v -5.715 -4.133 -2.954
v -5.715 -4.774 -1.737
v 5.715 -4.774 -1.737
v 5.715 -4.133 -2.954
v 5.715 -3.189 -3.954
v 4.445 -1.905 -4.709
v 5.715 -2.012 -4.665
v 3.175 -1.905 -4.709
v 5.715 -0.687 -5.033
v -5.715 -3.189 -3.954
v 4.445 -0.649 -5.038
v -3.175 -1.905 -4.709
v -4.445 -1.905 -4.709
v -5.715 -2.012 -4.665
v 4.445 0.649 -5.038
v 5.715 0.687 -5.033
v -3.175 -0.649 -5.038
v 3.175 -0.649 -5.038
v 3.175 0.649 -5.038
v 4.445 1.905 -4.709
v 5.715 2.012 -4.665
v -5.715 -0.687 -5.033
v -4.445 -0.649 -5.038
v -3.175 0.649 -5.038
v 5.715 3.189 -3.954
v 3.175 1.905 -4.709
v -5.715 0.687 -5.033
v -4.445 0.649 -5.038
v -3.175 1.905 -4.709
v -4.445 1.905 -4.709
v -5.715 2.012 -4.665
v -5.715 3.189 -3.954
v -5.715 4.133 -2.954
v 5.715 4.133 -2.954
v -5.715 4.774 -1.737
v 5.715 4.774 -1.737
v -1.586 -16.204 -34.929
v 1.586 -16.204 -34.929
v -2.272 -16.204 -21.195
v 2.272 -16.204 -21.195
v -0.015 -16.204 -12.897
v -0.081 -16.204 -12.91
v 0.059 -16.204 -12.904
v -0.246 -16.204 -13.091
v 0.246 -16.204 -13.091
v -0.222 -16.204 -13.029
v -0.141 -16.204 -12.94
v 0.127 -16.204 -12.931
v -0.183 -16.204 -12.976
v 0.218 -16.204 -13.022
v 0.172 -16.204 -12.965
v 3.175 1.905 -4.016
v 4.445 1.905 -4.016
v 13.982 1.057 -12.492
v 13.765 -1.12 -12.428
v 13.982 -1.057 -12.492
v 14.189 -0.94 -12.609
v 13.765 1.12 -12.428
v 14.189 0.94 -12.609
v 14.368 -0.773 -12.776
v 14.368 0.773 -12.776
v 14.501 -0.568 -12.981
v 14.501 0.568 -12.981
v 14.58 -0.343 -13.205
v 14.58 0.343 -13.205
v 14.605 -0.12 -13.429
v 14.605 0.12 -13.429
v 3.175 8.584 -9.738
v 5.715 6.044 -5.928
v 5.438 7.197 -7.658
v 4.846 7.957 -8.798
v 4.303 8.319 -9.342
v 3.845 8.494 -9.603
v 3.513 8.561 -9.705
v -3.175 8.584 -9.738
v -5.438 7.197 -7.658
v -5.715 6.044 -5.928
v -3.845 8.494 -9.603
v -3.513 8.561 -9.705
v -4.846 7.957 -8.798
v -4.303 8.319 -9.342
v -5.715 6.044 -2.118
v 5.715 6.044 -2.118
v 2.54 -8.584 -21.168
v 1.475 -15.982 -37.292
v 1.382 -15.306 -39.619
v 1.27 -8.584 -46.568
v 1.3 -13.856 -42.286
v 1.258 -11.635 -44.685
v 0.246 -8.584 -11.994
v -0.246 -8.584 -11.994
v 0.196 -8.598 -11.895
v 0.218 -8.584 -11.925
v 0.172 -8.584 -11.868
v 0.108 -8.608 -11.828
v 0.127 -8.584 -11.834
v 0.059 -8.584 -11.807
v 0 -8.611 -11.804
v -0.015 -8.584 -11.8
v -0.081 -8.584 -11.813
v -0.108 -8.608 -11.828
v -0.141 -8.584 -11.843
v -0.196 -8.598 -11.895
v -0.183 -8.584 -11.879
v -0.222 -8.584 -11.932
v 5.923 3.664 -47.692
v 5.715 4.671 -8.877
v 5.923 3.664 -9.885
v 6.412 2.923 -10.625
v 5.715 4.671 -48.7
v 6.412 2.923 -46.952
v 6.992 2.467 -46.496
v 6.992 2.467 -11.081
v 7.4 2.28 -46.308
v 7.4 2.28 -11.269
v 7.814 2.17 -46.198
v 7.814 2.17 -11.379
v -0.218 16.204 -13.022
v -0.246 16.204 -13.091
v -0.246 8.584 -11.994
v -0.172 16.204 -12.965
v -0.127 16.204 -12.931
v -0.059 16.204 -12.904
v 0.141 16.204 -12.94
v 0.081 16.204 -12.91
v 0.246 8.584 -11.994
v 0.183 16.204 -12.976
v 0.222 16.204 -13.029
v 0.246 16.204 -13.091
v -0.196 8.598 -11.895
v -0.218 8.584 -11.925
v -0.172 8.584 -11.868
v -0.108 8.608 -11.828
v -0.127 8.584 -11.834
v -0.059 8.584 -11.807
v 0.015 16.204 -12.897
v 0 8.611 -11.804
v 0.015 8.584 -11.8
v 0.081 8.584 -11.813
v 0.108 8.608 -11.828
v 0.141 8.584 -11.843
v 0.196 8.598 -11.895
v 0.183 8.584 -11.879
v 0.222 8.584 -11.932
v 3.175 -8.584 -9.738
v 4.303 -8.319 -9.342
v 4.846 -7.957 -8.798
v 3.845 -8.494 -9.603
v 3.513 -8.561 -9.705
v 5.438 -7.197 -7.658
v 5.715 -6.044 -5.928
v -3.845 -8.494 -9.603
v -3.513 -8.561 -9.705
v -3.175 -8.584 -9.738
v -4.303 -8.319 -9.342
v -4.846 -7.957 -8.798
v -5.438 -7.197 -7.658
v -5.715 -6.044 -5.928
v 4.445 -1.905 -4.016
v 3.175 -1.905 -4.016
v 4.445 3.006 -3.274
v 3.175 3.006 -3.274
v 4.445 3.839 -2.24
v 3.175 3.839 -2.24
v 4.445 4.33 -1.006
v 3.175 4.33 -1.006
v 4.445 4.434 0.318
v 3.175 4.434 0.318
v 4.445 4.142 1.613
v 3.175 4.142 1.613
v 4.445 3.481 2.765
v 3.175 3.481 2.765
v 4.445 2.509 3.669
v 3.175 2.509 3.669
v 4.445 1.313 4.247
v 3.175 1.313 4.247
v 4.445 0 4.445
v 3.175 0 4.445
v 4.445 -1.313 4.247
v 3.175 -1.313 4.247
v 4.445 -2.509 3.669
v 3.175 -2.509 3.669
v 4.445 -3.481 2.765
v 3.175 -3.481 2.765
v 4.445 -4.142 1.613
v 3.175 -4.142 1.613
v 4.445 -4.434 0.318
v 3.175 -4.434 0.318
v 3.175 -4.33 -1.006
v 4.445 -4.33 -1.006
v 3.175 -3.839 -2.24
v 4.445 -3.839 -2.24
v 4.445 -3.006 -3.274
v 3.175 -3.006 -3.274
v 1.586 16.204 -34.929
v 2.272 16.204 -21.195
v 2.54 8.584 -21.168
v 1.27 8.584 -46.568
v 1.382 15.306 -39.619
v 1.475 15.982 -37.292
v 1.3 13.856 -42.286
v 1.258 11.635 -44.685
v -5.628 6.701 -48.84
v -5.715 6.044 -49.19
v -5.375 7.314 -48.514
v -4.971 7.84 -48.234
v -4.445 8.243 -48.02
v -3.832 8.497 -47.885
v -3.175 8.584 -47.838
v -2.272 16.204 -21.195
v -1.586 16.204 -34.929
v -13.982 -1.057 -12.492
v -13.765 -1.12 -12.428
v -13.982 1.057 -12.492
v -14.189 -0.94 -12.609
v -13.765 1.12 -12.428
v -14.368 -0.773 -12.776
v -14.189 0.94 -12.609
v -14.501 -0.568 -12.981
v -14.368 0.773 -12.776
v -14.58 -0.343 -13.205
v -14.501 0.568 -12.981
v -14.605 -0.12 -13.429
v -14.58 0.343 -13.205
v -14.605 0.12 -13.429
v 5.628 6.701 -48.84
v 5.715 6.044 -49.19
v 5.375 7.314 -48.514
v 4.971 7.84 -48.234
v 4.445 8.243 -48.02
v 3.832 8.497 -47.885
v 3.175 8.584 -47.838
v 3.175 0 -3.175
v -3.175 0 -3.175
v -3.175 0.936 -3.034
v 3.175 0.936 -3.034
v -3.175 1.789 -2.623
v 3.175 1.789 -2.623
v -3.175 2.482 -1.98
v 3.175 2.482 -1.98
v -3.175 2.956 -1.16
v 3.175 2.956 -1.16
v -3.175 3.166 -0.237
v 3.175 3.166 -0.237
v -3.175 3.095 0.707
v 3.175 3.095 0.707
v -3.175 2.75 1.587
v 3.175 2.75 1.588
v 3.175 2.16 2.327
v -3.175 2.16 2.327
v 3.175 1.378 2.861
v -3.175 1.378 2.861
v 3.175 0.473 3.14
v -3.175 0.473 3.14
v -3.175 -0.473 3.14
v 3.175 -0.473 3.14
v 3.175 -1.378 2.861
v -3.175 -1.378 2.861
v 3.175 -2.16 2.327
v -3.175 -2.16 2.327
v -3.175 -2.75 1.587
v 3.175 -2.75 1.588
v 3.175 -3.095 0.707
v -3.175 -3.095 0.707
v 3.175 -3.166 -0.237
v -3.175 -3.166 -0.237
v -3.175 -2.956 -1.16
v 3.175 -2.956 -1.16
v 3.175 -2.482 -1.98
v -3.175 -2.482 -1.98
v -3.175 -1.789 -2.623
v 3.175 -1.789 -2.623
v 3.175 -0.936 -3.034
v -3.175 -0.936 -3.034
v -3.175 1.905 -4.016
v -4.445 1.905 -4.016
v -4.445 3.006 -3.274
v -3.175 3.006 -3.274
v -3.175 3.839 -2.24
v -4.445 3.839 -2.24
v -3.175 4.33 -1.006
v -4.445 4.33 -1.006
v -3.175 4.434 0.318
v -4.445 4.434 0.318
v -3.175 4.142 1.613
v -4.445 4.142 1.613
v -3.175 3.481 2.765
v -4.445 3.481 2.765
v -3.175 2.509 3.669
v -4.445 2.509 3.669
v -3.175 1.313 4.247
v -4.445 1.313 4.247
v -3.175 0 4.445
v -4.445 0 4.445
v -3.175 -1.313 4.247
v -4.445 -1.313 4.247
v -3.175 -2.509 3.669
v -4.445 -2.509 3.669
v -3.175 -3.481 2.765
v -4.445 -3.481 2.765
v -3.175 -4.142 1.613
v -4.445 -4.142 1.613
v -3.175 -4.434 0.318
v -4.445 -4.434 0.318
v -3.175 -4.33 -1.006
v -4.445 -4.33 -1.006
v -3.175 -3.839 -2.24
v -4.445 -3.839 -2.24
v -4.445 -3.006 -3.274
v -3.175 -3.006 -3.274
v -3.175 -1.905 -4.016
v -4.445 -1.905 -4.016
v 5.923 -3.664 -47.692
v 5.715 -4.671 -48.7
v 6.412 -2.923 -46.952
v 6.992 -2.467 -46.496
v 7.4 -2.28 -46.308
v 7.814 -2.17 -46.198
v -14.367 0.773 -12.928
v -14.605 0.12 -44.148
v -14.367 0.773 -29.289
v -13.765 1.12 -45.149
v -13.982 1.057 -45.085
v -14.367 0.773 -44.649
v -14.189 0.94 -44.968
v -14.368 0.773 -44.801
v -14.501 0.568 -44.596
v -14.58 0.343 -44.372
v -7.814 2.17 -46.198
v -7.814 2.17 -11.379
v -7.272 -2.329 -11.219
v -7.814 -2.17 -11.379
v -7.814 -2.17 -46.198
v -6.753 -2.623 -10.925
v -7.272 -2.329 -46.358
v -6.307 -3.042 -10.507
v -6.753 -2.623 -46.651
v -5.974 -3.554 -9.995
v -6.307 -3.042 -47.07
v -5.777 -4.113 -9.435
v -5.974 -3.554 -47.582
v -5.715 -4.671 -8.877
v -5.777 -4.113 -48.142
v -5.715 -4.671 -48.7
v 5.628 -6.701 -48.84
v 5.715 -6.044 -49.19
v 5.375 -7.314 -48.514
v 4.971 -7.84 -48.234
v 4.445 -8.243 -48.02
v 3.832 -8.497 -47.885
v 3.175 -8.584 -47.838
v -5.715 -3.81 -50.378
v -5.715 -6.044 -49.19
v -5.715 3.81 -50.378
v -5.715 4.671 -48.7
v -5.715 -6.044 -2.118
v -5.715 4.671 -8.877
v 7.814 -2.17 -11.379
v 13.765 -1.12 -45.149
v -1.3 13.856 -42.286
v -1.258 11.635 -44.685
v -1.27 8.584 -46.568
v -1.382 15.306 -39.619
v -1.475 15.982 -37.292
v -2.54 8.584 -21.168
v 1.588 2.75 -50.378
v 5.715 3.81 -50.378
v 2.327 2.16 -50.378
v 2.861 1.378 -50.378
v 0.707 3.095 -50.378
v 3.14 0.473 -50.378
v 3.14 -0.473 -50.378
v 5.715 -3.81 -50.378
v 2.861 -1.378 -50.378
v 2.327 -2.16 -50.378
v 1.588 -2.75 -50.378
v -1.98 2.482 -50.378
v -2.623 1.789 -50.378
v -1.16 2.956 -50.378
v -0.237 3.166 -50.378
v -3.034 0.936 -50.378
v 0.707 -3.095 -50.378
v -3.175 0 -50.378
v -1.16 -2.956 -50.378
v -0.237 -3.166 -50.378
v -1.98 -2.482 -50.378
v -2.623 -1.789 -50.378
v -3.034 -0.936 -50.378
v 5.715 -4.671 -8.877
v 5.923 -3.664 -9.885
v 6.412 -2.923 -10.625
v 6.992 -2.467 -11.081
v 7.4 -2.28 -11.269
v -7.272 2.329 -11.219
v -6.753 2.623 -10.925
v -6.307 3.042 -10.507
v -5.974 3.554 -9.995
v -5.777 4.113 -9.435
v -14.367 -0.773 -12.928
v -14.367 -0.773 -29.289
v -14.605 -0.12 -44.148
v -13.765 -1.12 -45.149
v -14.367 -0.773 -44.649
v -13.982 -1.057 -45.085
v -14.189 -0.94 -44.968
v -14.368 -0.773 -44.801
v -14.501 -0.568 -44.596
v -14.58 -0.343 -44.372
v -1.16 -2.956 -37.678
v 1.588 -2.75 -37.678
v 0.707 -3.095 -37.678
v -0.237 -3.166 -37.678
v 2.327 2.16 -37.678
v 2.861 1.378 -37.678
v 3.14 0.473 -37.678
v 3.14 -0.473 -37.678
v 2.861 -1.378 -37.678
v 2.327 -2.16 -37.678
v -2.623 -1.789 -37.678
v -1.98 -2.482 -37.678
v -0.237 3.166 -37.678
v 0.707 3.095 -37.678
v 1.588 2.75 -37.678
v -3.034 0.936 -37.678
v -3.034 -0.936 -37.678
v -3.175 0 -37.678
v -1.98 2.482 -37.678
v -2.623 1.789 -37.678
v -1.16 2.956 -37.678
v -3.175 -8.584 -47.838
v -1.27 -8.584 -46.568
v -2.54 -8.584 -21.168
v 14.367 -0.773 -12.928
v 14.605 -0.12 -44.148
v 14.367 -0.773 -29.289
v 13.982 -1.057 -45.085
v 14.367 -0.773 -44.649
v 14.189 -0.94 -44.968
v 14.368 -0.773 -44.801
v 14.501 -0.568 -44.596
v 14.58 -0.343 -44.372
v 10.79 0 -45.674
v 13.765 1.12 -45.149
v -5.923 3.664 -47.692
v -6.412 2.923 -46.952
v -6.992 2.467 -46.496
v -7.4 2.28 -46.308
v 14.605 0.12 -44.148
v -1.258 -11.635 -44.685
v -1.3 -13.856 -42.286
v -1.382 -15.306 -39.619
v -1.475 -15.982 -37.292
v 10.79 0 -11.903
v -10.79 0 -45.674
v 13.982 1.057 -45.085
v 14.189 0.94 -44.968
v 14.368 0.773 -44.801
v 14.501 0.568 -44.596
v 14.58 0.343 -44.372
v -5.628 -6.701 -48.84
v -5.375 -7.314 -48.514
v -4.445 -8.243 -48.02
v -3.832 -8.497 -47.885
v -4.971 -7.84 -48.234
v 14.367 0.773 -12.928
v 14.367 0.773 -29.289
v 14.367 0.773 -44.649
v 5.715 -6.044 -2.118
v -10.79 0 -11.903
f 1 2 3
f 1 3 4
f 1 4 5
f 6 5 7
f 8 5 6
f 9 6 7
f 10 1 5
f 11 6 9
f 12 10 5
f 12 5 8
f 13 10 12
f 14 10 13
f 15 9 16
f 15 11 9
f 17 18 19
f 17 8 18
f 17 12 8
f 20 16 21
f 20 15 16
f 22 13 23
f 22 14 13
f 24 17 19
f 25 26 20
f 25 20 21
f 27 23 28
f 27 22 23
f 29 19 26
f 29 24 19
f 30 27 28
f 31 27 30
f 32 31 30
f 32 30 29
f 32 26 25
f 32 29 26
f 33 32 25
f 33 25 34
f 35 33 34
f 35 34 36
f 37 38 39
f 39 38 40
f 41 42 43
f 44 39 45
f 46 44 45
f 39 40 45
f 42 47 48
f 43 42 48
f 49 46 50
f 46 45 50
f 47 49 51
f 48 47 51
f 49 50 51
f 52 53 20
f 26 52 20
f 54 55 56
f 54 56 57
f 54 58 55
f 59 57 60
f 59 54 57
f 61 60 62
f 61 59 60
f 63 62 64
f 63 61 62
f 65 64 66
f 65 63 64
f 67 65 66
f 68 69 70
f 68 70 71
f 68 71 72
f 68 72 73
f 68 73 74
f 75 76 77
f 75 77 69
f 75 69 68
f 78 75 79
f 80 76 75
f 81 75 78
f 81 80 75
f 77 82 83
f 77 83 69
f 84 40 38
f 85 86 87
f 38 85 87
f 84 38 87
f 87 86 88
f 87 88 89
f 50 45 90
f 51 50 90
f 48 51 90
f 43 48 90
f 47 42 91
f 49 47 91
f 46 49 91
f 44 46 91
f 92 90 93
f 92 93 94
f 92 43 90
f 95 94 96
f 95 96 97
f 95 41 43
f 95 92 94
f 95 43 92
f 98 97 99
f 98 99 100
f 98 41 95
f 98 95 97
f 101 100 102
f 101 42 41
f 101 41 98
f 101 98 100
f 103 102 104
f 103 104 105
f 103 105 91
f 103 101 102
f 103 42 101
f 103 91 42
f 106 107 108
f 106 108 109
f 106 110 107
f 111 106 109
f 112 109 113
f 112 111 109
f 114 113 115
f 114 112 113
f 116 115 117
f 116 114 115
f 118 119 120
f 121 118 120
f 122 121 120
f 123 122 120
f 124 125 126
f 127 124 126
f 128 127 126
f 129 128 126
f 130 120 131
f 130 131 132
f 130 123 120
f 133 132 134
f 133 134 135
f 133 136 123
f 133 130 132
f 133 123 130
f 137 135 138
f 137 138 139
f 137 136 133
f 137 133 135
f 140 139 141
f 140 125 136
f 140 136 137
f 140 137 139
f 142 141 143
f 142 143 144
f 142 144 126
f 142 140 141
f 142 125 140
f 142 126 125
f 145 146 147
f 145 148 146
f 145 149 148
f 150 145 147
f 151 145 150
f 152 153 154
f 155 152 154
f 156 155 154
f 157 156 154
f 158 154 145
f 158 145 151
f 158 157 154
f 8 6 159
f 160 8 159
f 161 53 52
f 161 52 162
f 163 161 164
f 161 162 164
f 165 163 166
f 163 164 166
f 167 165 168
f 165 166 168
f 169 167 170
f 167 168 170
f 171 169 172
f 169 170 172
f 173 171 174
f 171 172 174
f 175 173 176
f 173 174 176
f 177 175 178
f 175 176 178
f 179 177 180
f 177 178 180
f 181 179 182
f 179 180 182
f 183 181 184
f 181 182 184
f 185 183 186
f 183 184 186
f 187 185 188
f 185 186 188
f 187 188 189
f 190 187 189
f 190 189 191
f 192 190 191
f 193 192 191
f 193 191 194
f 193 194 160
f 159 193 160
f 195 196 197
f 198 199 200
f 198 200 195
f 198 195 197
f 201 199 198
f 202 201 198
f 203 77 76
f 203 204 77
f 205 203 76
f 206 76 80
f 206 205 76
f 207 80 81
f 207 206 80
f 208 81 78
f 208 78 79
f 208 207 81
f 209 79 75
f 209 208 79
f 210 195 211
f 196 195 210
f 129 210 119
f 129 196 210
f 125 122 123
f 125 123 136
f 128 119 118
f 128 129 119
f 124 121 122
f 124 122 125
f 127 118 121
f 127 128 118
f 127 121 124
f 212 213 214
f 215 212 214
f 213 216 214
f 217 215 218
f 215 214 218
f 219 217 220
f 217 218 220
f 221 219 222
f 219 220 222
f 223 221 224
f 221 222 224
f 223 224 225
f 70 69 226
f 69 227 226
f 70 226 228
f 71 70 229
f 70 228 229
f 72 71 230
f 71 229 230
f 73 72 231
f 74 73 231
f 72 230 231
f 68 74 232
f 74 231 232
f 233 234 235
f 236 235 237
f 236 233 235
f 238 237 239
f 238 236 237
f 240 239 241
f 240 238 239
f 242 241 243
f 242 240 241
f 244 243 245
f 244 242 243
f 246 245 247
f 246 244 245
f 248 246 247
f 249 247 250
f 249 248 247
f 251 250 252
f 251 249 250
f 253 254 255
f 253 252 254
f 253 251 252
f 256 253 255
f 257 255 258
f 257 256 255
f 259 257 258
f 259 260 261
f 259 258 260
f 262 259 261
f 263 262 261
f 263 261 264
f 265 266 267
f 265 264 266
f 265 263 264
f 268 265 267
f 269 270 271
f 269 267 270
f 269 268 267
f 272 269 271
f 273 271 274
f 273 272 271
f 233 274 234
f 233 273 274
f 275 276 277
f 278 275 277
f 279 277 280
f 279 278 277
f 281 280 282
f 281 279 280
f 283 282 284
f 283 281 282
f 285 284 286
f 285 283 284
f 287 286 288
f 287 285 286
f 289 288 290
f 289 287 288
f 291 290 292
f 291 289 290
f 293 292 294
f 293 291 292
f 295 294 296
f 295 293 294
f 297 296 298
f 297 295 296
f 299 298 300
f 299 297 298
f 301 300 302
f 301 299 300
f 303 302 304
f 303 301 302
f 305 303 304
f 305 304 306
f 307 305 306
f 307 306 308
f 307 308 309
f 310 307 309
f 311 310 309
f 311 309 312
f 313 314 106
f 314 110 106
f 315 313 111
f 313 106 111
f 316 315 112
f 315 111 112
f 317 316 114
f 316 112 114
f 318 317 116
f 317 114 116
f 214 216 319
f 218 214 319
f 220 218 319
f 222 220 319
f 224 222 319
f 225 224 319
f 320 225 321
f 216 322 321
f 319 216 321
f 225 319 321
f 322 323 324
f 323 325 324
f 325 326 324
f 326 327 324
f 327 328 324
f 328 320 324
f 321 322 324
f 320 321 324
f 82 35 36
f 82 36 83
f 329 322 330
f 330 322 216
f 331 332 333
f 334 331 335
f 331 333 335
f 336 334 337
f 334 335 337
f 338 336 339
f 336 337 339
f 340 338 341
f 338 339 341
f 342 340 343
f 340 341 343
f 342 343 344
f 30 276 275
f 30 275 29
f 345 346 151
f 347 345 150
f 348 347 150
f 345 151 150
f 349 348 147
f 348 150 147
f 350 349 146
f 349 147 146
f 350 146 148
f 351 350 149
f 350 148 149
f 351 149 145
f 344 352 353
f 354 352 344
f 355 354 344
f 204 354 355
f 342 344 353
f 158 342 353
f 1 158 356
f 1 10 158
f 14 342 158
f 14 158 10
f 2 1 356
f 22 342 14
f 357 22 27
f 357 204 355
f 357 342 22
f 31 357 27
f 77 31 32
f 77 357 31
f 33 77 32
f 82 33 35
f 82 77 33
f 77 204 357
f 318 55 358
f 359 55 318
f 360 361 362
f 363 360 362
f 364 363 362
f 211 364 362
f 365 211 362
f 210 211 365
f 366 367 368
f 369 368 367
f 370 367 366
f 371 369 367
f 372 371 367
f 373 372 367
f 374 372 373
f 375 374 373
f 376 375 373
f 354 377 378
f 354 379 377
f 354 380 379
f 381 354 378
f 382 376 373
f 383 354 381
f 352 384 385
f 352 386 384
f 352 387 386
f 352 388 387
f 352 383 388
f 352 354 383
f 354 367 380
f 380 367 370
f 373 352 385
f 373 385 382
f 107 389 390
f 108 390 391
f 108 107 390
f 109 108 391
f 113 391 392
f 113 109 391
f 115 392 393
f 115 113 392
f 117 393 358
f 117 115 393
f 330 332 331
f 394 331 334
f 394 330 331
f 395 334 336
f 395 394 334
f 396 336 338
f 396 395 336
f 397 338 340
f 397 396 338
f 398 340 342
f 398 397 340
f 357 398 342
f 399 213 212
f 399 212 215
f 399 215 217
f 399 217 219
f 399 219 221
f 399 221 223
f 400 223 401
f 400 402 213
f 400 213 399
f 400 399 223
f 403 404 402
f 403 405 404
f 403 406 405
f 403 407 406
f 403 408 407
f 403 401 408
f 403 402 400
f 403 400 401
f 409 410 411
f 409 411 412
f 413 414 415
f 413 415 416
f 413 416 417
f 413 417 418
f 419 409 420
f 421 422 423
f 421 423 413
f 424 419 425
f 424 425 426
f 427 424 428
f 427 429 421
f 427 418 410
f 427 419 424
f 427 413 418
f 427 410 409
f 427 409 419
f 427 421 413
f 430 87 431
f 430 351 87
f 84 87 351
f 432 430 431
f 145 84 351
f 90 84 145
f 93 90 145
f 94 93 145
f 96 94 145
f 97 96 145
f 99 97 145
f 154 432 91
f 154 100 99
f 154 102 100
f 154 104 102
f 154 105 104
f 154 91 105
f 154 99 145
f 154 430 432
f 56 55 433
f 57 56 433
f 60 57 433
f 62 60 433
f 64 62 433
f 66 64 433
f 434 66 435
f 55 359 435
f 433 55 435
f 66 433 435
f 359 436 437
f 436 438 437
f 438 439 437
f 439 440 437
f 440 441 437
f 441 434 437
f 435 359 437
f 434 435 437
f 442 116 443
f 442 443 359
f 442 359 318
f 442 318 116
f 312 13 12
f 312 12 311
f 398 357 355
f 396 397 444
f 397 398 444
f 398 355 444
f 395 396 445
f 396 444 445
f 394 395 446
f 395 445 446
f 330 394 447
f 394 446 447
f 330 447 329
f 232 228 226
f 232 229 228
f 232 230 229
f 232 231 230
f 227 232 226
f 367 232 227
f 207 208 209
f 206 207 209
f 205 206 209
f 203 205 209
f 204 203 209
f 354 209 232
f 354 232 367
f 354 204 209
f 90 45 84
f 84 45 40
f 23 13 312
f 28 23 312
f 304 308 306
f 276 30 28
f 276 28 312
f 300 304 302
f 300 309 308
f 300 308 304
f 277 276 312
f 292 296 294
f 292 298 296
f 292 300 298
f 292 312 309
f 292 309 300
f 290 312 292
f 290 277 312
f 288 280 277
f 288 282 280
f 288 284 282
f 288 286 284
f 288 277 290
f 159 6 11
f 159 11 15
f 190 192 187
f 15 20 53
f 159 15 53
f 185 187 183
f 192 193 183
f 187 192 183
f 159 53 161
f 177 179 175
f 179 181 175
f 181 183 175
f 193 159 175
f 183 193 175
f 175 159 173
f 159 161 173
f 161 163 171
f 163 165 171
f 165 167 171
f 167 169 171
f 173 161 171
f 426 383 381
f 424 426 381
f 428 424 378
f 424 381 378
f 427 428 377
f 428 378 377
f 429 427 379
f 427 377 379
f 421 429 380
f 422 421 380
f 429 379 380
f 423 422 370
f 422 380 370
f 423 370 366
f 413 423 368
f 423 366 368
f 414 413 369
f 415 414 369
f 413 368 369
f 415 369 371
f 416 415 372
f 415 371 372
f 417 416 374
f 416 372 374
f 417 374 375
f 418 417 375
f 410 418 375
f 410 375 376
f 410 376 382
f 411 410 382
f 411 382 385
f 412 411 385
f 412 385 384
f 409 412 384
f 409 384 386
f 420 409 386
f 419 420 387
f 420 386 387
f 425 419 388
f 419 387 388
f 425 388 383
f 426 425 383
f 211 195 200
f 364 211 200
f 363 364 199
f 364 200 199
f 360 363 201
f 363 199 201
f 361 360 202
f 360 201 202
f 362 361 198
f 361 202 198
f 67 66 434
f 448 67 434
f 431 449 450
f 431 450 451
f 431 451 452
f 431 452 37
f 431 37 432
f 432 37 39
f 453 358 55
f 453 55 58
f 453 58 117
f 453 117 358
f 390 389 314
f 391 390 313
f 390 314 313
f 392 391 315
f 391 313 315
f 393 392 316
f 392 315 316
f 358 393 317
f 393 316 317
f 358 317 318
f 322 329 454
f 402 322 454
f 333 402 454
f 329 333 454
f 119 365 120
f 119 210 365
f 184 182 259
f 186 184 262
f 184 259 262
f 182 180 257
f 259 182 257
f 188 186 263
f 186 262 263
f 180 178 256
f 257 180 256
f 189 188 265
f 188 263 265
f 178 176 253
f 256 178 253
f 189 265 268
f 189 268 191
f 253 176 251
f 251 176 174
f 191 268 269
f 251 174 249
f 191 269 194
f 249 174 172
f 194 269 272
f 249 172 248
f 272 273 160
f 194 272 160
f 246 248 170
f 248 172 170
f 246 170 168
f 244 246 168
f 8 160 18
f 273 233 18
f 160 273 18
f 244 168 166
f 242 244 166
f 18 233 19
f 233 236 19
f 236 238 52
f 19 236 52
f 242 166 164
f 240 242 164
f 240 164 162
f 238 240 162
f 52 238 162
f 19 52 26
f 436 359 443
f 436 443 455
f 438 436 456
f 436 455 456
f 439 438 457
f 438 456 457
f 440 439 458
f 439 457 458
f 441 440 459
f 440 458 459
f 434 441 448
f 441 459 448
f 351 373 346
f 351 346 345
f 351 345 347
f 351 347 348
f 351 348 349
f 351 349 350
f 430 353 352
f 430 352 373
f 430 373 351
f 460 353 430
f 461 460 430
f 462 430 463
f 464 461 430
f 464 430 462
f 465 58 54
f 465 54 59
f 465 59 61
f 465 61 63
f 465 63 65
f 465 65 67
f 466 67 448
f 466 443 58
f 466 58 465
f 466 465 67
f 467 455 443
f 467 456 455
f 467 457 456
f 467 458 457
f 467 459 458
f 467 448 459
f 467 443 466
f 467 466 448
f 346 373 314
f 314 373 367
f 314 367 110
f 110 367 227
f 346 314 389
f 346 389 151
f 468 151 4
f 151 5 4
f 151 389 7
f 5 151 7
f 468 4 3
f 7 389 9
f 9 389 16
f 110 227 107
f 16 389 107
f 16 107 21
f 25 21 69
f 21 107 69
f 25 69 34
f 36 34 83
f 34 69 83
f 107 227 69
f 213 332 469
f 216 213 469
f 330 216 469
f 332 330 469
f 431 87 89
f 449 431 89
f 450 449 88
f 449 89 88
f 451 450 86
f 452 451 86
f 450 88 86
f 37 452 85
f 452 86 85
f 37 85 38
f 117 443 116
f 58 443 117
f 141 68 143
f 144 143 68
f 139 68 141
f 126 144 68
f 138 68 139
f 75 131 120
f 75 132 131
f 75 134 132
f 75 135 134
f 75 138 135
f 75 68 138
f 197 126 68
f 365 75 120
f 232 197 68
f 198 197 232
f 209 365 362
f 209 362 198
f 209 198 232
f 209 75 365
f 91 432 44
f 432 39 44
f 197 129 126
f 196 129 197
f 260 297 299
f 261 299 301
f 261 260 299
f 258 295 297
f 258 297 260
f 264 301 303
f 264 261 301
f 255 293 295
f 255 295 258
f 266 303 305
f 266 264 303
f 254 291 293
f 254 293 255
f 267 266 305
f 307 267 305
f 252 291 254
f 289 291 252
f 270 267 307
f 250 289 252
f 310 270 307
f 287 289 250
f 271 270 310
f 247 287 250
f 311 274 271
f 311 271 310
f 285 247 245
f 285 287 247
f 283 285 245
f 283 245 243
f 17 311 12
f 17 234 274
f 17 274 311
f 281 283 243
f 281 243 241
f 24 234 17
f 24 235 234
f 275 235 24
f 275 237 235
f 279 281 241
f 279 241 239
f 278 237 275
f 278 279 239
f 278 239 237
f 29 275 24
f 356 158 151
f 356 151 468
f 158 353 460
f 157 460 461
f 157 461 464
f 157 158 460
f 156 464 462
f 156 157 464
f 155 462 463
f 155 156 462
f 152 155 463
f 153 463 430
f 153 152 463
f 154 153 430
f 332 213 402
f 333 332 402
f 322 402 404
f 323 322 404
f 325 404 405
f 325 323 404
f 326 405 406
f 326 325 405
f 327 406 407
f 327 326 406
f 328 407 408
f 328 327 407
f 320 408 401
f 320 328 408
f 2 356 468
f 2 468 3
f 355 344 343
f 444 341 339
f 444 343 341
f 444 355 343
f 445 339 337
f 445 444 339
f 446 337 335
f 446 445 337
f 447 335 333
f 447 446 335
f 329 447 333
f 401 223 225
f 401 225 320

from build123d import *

# Parameters (mm, degrees)
SKETCH1_R                = 3.175
BOSS_EXTRUDE1_DEPTH      = 3.175
SKETCH2_R                = 4.444999999999999
BOSS_EXTRUDE2_DEPTH      = 1.27
BOSS_EXTRUDE3_DEPTH      = 1.27
BOSS_EXTRUDE4_DEPTH      = 8.89
BOSS_EXTRUDE4_DEPTH_BACK = 2.54
SKETCH5_R                = 3.175
CUT_EXTRUDE1_DEPTH       = 12.7
FILLET1_R                = 2.54
SKETCH6_W                = 35.559999999999995
SKETCH6_H                = 5.08
BOSS_EXTRUDE5_DEPTH      = 8.889999999999999
BOSS_EXTRUDE5_TAPER      = 10.000000000000021
FILLET2_R                = 1.016
FILLET3_R                = 2.54
BOSS_EXTRUDE6_DEPTH      = 7.619999999999995
BOSS_EXTRUDE6_TAPER      = 2.000000000000002
FILLET4_R                = 0.254
FILLET5_R                = 12.7


with BuildPart() as part:
    # Sketch1 → Boss-Extrude1 (new, symmetric)
    with BuildSketch(Plane(origin=(0, 0, 0), x_dir=(0, 0, -1), z_dir=(1, 0, 0))):
        Circle(SKETCH1_R)
    extrude(amount=BOSS_EXTRUDE1_DEPTH, both=True)

    # Sketch2 → Boss-Extrude2 (add)
    with BuildSketch(Plane(origin=(3.175, 0, 0), x_dir=(0, 0, -1), z_dir=(1, 0, 0))):
        Circle(SKETCH2_R)
    boss_extrude2 = extrude(amount=BOSS_EXTRUDE2_DEPTH)

    # Mirror1: Boss-Extrude2 across plane
    add(boss_extrude2.mirror(Plane(origin=(0, 0, 0), x_dir=(0, 0, 1), z_dir=(1, 0, 0))))

    # Sketch3 → Boss-Extrude3 (add)
    with BuildSketch(Plane(origin=(4.445, 0, 0), x_dir=(0, 0, -1), z_dir=(1, 0, 0))):
        Polygon((-7.3e-16, 1.9049999999999998), (6.349999999999998, 1.9050000000000038), (6.349999999999999, -1.9049999999999998), (4.4e-16, -1.9049999999999998), align=None)
    boss_extrude3 = extrude(amount=-BOSS_EXTRUDE3_DEPTH)

    # Mirror2: Boss-Extrude3 across plane
    add(boss_extrude3.mirror(Plane(origin=(0, 0, 0), x_dir=(0, 0, 1), z_dir=(1, 0, 0))))

    # Sketch4 → Boss-Extrude4 (add, two sides: drawn at the far end of the back side and taken through both)
    with BuildSketch(Plane(origin=(-3.175, 0, 0), x_dir=(0, 0, -1), z_dir=(1, 0, 0)).offset(-BOSS_EXTRUDE4_DEPTH_BACK)):
        with BuildLine():
            Line((1.7374623280944008, 4.773638513592414), (2.1184623280943997, 6.0436385135924136))
            Line((2.1184623280943997, 6.0436385135924136), (5.928462328094399, 6.0436385135924136))
            Line((5.928462328094399, 6.0436385135924136), (9.738462328094398, 8.583638513592414))
            Line((9.738462328094398, 8.583638513592414), (47.838462328094394, 8.583638513592414))
            Line((47.838462328094394, 8.583638513592414), (50.3784623280944, 3.8099999999999996))
            Line((50.3784623280944, 3.8099999999999996), (50.3784623280944, -3.8099999999999996))
            Line((50.3784623280944, -3.8099999999999996), (47.838462328094394, -8.583638513592414))
            Line((47.838462328094394, -8.583638513592414), (9.738462328094398, -8.583638513592414))
            Line((9.738462328094398, -8.583638513592414), (5.928462328094399, -6.0436385135924136))
            Line((5.928462328094399, -6.0436385135924136), (2.1184623280943997, -6.0436385135924136))
            Line((2.1184623280943997, -6.0436385135924136), (1.7374623280944008, -4.773638513592414))
            ThreePointArc((1.7374623280944008, -4.773638513592414), (5.080000000000001, 0), (1.7374623280944008, 4.773638513592414))
        make_face()
    extrude(amount=BOSS_EXTRUDE4_DEPTH + BOSS_EXTRUDE4_DEPTH_BACK)

    # Sketch5 → Cut-Extrude1 (cut)
    with BuildSketch(Plane(origin=(0, 0, -50.3784623280944), x_dir=(-1, 0, 0), z_dir=(0, 0, -1))):
        Circle(SKETCH5_R)
    extrude(amount=-CUT_EXTRUDE1_DEPTH, mode=Mode.SUBTRACT)

    # Fillet1
    fillet1_edges = [part.edges().sort_by_distance(p)[0] for p in [
        (5.715000000000001, -8.583638513592414, -28.788462328094397),
        (-5.715, -8.583638513592414, -28.788462328094397),
        (-5.715, 8.583638513592414, -28.788462328094397),
        (5.715000000000001, 8.583638513592414, -28.788462328094397),
    ]]
    fillet(fillet1_edges, radius=FILLET1_R)

    # Sketch6 → Boss-Extrude5 (add)
    with BuildSketch(Plane(origin=(5.715000000000001, 0, 0), x_dir=(0, 0, -1), z_dir=(1, 0, 0))):
        with Locations((28.7884623280944, 0)):
            Rectangle(SKETCH6_W, SKETCH6_H)
    boss_extrude5 = extrude(amount=BOSS_EXTRUDE5_DEPTH, taper=BOSS_EXTRUDE5_TAPER)

    # Mirror3: Boss-Extrude5 across plane
    add(boss_extrude5.mirror(Plane(origin=(0, 0, 0), x_dir=(0, 0, 1), z_dir=(1, 0, 0))))

    # Fillet2
    fillet2_edges = [part.edges().sort_by_distance(p)[0] for p in [
        (14.605, -1.6e-16, -12.57600918659266),
        (14.605, -0.9724531415017433, -28.788462328094404),
        (14.605, -1.6e-16, -45.00091546959614),
        (14.605, 0.9724531415017431, -28.788462328094397),
        (-14.605, -1.6e-16, -12.57600918659266),
        (-14.605, 0.9724531415017431, -28.788462328094397),
        (-14.605, -1.6e-16, -45.00091546959614),
        (-14.605, -0.9724531415017433, -28.788462328094404),
    ]]
    fillet(fillet2_edges, radius=FILLET2_R)

    # Fillet3
    fillet3_edges = [part.edges().sort_by_distance(p)[0] for p in [
        (5.715000000000001, 0, -11.008462328094403),
        (5.715000000000001, -2.54, -28.7884623280944),
        (5.715000000000001, 0, -46.5684623280944),
        (5.715000000000001, 2.54, -28.7884623280944),
        (-5.715000000000001, 0, -11.008462328094403),
        (-5.715000000000001, -2.54, -28.7884623280944),
        (-5.715000000000001, 0, -46.5684623280944),
        (-5.715000000000001, 2.54, -28.7884623280944),
    ]]
    fillet(fillet3_edges, radius=FILLET3_R)

    # Sketch7 → Boss-Extrude6 (add)
    with BuildSketch(Plane(origin=(0, 8.583638513592414, 0), x_dir=(1, 0, 0), z_dir=(0, 1, 0))):
        Polygon((-1.27, 46.568462328094405), (-2.5399999999999983, 21.168462328094403), (0, 11.0084623280944), (2.5399999999999983, 21.168462328094403), (1.27, 46.568462328094405), align=None)
    boss_extrude6 = extrude(amount=BOSS_EXTRUDE6_DEPTH, taper=BOSS_EXTRUDE6_TAPER)

    # Mirror4: Boss-Extrude6 across plane
    add(boss_extrude6.mirror(Plane.ZX))

    # Fillet4
    fillet4_edges = [part.edges().sort_by_distance(p)[0] for p in [
        (0, 12.39363851359241, -11.557033828646649),
        (0, -12.39363851359241, -11.557033828646649),
    ]]
    fillet(fillet4_edges, radius=FILLET4_R)

    # Fillet5
    # the kernel refuses this fillet: 12.7 mm, written as the material it takes off along each edge
    with BuildSketch(Plane(origin=(29.450991141099852, -16.20363851359241, -46.30236606456729), x_dir=(0, 0.9993908270190958, -0.03489949670250097), z_dir=(-1, 0, 0))) as fillet5_piece_1:
        with BuildLine():
            CenterArc((12.295328982012144, -11.809941091943898), FILLET5_R, 111.57817847820185, 66.42182152179815)
            Line((-0.39693452113037153, -11.366717483822136), (-0.6507797911932232, -11.357853011659701))
            Line((-0.6507797911932232, -11.357853011659701), (-0.2538452700628517, 0.00886447216243529))
            Line((-0.2538452700628517, 0.00886447216243529), (-1.12e-15, 0.25399999999999656))
            ThreePointArc((-1.12e-15, 0.25399999999999656), (3.8123223637785104, 0.2539999999999965), (7.531231042467917, 0.23619882183887903))
            Line((7.531231042467917, 0.23619882183887903), (7.624644727557019, -4e-17))
        make_face()
    extrude(amount=58.90198228219971, mode=Mode.SUBTRACT)
    with BuildSketch(Plane(origin=(29.450991141099852, 16.20363851359241, -46.30236606456729), x_dir=(0, -0.9993908270190958, -0.03489949670250097), z_dir=(-1, 0, 0))) as fillet5_piece_2:
        with BuildLine():
            CenterArc((12.295328982012144, 11.809941091943898), FILLET5_R, 182, 66.42182152179817)
            Line((-0.39693452113037153, 11.366717483822136), (-0.6507797911932232, 11.357853011659701))
            Line((-0.6507797911932232, 11.357853011659701), (-0.2538452700628517, -0.00886447216243529))
            Line((-0.2538452700628517, -0.00886447216243529), (-1.12e-15, -0.25399999999999656))
            ThreePointArc((-1.12e-15, -0.25399999999999656), (3.8123223637785104, -0.2539999999999965), (7.531231042467917, -0.23619882183887903))
            Line((7.531231042467917, -0.23619882183887903), (7.624644727557019, 4e-17))
        make_face()
    extrude(amount=58.90198228219971, mode=Mode.SUBTRACT)


solid = part.part
